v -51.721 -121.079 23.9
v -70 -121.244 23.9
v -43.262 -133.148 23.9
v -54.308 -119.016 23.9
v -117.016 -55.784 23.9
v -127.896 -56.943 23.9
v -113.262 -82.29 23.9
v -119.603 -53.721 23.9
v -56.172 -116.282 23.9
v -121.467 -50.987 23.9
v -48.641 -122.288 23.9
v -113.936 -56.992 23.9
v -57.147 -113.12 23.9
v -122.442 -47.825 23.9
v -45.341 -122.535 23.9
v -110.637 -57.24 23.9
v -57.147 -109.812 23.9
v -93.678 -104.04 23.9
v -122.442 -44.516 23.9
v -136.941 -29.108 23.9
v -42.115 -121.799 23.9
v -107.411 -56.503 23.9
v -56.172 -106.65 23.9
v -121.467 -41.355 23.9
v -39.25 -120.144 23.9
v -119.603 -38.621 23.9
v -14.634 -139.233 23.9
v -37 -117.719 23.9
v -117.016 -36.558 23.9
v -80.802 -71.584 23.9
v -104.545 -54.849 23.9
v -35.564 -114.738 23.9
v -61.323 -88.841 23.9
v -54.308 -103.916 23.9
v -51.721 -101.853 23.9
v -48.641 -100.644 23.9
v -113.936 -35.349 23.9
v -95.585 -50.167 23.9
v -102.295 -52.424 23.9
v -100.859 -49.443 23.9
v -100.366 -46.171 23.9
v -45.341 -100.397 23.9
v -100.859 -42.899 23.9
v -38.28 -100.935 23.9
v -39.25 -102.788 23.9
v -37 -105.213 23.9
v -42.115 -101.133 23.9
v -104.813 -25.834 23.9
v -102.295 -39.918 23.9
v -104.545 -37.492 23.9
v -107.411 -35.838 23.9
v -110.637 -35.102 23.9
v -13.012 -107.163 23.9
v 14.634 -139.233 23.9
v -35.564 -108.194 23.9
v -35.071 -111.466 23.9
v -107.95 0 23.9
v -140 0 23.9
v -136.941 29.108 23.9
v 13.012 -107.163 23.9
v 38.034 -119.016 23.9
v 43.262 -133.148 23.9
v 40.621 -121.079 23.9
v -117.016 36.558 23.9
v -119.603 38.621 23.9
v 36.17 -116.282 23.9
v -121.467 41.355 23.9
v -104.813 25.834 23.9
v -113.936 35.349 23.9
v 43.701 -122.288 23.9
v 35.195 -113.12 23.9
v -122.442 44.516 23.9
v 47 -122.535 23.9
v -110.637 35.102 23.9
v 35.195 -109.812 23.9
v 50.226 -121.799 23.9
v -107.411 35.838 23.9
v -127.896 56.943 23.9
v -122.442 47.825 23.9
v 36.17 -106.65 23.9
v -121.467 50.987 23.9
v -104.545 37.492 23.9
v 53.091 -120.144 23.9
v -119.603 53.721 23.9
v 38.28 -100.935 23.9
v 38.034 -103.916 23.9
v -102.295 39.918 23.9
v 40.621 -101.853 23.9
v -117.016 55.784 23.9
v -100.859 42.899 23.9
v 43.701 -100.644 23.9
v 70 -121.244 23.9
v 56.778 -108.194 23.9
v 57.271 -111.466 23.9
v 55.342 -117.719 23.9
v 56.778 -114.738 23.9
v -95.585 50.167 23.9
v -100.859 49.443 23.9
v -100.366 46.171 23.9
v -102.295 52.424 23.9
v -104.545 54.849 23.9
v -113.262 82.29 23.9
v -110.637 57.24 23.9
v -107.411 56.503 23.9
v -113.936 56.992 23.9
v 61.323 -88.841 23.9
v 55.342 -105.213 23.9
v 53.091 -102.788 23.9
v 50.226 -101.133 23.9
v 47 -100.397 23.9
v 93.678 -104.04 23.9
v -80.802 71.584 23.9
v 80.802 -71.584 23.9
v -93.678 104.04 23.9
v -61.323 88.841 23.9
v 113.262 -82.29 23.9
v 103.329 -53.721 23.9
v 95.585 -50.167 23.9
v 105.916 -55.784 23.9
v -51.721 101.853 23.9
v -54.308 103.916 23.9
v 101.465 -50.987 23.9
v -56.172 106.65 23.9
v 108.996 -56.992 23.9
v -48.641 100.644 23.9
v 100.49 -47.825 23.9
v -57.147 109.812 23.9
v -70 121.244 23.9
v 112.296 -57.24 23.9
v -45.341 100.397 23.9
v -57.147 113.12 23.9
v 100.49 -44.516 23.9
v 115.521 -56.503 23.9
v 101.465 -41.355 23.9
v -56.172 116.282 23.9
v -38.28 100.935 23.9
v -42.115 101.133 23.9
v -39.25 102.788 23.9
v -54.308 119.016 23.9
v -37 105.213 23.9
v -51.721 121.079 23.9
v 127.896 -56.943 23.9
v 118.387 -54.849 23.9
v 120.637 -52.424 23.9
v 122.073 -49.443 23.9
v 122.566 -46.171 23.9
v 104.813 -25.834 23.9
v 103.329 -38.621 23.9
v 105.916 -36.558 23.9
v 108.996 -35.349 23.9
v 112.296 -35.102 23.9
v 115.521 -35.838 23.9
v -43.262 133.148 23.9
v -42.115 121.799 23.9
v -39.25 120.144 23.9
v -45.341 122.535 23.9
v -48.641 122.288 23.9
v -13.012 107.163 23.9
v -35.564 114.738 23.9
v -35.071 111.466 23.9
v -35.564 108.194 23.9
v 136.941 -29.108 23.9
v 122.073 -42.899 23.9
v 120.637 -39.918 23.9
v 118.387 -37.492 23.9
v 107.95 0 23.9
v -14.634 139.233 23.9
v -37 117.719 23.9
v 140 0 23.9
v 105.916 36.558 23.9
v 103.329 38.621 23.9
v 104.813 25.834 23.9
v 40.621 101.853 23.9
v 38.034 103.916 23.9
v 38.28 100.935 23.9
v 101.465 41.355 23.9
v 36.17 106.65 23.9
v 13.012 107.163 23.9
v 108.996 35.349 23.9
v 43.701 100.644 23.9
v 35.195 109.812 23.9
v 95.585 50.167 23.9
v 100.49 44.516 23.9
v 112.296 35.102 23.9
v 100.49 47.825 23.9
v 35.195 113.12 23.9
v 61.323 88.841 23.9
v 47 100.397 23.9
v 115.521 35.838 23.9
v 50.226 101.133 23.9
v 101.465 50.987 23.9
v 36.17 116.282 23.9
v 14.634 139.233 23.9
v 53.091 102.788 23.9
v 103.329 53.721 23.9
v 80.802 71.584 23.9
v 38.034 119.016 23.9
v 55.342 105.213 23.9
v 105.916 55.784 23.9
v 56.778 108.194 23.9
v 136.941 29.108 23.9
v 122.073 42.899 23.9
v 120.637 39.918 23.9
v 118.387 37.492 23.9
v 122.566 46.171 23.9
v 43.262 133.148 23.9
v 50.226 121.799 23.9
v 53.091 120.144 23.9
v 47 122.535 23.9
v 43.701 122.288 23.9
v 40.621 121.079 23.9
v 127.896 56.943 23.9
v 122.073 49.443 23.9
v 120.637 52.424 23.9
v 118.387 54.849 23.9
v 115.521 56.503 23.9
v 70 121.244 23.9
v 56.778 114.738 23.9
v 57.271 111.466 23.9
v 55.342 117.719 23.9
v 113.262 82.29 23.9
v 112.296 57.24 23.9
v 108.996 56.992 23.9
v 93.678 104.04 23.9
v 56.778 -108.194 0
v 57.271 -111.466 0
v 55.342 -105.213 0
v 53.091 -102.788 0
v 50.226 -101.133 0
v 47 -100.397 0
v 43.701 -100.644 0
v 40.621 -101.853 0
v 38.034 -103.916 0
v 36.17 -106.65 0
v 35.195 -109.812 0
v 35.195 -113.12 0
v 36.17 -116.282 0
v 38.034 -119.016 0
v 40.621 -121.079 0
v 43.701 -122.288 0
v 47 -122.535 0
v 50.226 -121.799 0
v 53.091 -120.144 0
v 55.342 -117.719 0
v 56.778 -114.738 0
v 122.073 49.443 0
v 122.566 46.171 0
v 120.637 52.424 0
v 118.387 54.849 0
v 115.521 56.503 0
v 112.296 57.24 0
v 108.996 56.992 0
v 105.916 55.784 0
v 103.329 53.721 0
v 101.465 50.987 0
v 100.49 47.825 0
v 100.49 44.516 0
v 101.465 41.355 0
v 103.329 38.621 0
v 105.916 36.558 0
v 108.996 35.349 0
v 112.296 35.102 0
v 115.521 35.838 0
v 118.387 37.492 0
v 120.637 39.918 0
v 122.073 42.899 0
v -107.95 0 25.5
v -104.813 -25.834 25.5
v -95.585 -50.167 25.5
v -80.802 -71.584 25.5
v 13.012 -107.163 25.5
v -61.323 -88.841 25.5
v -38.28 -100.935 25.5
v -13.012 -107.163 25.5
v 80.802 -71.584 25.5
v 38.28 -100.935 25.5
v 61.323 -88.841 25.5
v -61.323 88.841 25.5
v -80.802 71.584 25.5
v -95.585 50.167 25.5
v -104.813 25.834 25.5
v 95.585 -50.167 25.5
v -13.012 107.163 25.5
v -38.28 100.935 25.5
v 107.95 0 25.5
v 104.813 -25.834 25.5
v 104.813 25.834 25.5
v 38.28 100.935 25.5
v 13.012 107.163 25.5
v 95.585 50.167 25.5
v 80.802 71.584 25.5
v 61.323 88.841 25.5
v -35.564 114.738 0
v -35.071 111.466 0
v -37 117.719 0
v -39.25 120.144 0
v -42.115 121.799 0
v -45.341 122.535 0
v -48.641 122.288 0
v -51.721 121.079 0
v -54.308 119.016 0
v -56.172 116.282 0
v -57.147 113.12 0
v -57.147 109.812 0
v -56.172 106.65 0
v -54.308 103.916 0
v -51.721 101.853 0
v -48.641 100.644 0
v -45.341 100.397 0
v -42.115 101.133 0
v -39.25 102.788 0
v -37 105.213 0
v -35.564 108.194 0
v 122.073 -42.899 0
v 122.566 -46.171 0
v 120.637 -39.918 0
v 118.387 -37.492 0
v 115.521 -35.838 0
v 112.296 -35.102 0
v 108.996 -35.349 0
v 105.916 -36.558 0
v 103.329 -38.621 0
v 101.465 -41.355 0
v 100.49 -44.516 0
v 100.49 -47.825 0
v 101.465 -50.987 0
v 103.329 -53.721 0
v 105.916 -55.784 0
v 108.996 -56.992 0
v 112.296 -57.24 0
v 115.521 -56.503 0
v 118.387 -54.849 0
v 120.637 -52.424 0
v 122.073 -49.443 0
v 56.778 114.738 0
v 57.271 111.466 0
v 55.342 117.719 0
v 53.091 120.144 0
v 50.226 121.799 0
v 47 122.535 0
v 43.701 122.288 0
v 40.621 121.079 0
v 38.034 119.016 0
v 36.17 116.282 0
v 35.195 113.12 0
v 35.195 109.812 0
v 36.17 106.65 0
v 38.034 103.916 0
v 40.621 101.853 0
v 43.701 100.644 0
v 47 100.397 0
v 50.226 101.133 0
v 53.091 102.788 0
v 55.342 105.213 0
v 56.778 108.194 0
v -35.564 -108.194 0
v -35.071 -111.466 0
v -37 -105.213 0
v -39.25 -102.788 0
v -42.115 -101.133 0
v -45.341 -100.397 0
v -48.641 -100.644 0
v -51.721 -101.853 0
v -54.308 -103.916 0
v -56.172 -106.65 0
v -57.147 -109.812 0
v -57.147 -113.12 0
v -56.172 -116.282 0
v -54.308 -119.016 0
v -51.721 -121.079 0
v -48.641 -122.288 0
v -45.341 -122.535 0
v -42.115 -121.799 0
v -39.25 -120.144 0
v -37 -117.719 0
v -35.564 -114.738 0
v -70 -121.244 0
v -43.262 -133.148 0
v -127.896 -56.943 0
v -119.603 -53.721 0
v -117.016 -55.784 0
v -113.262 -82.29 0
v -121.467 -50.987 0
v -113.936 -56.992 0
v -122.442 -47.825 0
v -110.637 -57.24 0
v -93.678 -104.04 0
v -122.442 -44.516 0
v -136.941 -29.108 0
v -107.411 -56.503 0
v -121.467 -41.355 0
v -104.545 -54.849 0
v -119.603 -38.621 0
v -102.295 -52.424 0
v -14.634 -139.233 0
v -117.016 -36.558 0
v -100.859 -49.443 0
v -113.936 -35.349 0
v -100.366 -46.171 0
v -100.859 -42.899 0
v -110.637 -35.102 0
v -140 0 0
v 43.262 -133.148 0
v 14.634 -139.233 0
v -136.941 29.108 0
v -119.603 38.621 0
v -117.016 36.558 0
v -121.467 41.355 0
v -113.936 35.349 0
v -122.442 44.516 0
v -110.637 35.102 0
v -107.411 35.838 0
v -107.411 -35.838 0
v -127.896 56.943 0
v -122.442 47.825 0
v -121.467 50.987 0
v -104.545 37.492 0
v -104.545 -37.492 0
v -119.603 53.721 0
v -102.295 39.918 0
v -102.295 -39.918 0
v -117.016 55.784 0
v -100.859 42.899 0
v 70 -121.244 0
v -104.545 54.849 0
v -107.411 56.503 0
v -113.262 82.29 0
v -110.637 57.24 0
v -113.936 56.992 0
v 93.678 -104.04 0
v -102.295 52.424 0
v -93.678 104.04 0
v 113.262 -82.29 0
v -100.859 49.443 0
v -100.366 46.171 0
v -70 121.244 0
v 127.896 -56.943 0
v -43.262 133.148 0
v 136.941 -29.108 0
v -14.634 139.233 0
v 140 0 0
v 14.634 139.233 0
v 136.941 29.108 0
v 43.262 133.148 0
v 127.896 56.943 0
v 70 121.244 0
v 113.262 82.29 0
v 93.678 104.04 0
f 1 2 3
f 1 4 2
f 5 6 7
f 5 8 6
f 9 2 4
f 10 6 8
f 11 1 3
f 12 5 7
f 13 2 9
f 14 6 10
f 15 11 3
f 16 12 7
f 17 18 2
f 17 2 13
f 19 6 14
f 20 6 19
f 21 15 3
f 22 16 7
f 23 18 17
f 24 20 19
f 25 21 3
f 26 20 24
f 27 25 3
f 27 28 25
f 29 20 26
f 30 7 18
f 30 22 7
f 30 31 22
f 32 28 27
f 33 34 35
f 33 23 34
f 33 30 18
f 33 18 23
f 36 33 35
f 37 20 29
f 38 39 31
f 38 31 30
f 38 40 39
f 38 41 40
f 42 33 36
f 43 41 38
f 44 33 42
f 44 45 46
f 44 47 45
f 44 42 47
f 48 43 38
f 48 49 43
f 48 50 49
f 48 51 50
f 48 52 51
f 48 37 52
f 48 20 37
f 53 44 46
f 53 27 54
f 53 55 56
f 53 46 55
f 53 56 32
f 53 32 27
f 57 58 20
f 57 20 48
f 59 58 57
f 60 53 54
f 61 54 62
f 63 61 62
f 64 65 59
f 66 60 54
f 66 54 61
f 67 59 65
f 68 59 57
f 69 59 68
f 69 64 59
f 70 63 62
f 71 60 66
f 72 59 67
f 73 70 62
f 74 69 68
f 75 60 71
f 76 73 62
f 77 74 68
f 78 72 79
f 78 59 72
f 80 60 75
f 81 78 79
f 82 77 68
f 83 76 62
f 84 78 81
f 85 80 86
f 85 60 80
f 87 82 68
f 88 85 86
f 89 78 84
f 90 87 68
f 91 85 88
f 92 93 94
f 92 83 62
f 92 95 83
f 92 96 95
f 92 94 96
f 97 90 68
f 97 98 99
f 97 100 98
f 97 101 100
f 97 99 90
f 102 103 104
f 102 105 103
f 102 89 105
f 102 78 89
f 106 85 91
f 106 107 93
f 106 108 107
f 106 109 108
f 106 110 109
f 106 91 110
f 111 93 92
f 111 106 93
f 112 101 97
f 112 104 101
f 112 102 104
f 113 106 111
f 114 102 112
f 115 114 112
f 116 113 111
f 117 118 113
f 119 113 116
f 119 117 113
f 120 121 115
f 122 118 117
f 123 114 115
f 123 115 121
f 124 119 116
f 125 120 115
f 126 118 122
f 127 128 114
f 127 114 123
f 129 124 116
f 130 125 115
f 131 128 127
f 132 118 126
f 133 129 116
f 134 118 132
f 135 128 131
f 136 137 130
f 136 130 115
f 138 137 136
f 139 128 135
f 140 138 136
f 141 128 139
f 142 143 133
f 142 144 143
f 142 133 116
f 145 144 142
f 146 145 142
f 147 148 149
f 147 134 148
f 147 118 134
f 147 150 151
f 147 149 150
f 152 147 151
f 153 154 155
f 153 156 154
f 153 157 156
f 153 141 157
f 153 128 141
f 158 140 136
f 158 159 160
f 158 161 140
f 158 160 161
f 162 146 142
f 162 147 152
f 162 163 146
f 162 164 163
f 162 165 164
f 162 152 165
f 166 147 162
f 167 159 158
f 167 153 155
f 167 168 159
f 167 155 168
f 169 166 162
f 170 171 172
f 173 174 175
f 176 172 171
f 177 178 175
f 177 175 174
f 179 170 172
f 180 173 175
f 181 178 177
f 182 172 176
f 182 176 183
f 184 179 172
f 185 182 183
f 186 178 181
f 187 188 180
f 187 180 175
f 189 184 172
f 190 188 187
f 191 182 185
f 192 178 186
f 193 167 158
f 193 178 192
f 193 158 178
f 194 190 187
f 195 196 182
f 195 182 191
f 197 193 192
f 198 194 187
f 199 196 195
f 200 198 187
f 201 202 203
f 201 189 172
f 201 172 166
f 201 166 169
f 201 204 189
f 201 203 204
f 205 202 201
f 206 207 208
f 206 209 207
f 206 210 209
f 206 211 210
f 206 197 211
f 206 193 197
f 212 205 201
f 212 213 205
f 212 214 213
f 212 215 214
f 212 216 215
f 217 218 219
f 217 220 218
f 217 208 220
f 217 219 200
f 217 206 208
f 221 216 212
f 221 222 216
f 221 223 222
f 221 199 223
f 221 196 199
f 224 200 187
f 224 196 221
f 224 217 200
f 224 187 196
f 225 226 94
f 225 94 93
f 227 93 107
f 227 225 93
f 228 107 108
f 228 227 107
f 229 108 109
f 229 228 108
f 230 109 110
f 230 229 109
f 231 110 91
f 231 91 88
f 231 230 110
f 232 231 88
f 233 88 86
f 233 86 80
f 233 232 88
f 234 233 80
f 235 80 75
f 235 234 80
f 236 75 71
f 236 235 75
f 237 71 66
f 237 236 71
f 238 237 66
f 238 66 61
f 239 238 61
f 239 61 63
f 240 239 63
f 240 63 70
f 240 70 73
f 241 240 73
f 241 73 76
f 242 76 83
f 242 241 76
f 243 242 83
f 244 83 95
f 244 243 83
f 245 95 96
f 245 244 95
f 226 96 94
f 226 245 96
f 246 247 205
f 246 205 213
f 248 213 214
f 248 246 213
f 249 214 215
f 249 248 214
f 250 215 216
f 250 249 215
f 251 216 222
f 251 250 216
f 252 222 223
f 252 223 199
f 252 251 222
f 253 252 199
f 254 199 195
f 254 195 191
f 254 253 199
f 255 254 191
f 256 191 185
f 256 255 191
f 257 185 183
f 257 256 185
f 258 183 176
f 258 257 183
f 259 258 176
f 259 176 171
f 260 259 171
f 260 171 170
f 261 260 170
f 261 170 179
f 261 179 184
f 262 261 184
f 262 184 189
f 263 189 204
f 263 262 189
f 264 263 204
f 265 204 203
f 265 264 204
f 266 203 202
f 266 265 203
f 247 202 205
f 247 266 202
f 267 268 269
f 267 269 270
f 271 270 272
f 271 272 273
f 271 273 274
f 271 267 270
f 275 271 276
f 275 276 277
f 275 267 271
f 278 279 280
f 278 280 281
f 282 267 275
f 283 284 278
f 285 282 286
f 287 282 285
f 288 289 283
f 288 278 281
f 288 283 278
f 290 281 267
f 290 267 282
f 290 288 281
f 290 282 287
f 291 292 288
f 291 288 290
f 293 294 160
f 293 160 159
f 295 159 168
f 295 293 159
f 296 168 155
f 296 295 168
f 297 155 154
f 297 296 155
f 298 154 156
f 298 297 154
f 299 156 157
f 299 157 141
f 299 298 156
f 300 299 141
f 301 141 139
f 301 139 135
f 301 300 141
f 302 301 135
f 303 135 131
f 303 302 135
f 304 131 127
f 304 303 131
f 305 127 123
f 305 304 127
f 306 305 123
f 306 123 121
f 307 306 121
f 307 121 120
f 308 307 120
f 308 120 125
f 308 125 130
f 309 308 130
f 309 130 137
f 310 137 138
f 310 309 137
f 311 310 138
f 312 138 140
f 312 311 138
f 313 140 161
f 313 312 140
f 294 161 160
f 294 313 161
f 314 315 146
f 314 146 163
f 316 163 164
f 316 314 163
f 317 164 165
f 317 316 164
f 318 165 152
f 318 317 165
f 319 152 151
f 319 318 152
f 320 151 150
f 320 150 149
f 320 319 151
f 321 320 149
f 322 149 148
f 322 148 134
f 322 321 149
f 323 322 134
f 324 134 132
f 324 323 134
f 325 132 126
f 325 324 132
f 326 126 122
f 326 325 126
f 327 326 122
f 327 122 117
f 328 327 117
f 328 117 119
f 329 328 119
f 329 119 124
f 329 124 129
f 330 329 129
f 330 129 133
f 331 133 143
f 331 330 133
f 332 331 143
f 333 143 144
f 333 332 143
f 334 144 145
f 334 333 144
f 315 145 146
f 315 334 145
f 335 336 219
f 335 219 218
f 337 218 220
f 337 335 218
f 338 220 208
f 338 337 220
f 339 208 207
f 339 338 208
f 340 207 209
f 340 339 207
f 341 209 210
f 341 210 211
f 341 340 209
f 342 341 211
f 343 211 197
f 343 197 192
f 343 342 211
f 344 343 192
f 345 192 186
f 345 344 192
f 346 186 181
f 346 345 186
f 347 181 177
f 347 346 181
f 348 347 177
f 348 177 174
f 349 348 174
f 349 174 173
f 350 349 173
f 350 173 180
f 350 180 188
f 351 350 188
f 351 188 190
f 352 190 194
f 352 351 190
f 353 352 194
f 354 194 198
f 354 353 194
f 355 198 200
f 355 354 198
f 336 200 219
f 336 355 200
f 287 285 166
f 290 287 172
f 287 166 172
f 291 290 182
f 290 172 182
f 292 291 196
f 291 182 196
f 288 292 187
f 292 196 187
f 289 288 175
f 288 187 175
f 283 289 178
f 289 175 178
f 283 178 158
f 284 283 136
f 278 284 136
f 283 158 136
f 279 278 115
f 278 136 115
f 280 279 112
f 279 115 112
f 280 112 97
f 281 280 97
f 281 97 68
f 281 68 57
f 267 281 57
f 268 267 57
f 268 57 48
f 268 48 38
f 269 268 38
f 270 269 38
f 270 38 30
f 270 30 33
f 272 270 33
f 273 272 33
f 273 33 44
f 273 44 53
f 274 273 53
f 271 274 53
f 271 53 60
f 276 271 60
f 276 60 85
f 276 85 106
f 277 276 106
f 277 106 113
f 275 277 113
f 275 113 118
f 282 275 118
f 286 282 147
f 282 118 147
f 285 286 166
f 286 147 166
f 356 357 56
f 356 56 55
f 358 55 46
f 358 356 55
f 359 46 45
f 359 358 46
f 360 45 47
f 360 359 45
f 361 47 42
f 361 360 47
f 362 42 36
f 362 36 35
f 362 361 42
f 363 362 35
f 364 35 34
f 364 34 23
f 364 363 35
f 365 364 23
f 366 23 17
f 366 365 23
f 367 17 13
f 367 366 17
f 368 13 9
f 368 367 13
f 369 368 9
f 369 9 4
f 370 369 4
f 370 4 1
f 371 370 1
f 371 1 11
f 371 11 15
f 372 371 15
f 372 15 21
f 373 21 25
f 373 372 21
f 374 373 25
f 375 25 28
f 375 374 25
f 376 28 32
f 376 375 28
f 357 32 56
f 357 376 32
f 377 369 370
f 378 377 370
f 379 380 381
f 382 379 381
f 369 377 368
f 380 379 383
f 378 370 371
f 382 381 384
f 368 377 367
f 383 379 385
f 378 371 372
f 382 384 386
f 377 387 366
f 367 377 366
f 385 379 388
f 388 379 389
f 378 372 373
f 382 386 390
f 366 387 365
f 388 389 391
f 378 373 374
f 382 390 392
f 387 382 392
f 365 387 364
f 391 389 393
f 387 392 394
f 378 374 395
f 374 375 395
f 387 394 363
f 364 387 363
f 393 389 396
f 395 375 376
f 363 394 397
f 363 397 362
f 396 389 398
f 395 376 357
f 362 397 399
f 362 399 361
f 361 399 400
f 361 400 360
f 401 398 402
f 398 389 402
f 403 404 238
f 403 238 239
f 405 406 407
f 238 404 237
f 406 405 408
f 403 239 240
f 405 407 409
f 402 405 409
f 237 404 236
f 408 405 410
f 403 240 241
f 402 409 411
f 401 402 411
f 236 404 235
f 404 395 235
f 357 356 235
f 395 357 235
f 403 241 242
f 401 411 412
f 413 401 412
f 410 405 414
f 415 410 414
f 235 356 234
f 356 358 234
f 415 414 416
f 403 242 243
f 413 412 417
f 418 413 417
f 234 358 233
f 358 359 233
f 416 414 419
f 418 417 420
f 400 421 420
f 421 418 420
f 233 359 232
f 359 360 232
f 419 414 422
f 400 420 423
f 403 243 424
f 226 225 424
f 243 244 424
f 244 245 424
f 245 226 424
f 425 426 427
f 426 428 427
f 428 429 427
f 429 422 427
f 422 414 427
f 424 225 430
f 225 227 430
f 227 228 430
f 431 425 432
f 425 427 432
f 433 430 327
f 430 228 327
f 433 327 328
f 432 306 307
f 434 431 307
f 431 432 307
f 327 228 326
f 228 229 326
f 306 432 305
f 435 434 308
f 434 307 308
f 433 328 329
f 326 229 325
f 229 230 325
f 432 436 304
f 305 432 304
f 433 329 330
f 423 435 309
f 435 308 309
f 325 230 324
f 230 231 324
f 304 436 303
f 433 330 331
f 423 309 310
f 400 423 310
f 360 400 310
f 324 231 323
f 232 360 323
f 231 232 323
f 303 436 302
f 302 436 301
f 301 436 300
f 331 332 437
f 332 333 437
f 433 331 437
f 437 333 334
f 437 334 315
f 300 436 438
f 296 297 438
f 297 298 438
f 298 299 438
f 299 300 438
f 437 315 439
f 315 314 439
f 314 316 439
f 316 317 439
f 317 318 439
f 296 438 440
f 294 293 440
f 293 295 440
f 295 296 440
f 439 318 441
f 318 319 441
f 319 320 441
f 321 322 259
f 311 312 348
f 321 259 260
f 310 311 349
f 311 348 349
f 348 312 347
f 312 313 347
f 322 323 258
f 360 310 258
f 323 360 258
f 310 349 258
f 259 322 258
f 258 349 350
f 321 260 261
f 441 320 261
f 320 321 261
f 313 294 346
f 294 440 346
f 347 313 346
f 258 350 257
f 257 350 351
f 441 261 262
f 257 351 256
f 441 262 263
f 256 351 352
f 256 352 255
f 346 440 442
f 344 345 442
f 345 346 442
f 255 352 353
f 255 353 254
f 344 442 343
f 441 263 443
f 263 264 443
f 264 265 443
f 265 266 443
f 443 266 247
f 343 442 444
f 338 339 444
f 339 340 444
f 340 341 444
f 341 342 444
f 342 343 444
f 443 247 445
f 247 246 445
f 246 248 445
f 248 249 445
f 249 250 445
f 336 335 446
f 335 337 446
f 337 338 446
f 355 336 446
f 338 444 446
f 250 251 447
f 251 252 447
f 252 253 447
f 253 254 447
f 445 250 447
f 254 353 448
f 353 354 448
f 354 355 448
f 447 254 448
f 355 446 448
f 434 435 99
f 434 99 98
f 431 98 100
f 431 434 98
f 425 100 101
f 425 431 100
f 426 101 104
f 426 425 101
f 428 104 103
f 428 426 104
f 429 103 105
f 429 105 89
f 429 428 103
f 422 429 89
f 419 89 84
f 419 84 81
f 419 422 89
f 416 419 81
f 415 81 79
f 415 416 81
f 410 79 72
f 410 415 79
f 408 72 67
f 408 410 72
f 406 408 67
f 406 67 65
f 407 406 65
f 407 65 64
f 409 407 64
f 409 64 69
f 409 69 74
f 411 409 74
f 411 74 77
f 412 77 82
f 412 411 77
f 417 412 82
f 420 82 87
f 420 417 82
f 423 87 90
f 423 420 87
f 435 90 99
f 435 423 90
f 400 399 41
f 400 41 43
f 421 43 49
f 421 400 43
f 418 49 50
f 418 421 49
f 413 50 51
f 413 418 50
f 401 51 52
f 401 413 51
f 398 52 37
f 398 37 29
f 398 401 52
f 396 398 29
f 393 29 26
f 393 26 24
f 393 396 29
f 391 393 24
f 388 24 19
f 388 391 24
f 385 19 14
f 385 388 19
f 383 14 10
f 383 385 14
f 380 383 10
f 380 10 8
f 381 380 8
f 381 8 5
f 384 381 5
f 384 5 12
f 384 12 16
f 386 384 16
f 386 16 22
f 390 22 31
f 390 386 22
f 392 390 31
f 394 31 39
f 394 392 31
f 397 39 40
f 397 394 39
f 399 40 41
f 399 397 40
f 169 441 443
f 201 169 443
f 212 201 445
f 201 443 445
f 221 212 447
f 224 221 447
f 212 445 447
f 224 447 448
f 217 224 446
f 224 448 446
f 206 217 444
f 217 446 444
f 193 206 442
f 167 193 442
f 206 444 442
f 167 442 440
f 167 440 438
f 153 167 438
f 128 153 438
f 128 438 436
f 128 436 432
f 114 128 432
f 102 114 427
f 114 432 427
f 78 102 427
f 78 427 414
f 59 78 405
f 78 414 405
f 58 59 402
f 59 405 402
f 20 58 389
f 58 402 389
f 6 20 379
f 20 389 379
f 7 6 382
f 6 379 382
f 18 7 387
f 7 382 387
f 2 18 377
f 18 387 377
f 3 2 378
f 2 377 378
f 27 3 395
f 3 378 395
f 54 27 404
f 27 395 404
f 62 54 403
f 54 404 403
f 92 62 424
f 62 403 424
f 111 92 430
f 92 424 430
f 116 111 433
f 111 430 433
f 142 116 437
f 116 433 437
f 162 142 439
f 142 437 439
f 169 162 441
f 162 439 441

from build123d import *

# Parameters (mm, degrees)
F2_R     = 140
F2_R_2   = 11.1
F2_R_3   = 107.95
F4_DEPTH = 23.9
F5_DEPTH = 25.5


# Not quite as in the source:
# - a feature names something its author has since deleted; it is built from what else it names


with BuildPart() as f4:
    # F2 (on Top) → F4 (new body)
    with BuildSketch(Plane.XY):
        Circle(F2_R)
        with Locations((-46.1707561148, -111.4660655975)):
            Circle(F2_R_2, mode=Mode.SUBTRACT)
        with Locations((-111.4660655975, -46.1707561148)):
            Circle(F2_R_2, mode=Mode.SUBTRACT)
        with Locations((46.1707561148, -111.4660655975)):
            Circle(F2_R_2, mode=Mode.SUBTRACT)
        with Locations((111.4660655975, -46.1707561148)):
            Circle(F2_R_2, mode=Mode.SUBTRACT)
        with Locations((-111.4660655975, 46.1707561148)):
            Circle(F2_R_2, mode=Mode.SUBTRACT)
        with Locations((-46.1707561148, 111.4660655975)):
            Circle(F2_R_2, mode=Mode.SUBTRACT)
        Circle(F2_R_3, mode=Mode.SUBTRACT)
        with Locations((111.4660655975, 46.1707561148)):
            Circle(F2_R_2, mode=Mode.SUBTRACT)
        with Locations((46.1707561148, 111.4660655975)):
            Circle(F2_R_2, mode=Mode.SUBTRACT)
        Circle(F2_R_3)
    extrude(amount=F4_DEPTH)

    # F2 (on Top) → F5 (join)
    with BuildSketch(Plane.XY):
        Circle(F2_R_3)
    extrude(amount=F5_DEPTH)


solid = f4.part
